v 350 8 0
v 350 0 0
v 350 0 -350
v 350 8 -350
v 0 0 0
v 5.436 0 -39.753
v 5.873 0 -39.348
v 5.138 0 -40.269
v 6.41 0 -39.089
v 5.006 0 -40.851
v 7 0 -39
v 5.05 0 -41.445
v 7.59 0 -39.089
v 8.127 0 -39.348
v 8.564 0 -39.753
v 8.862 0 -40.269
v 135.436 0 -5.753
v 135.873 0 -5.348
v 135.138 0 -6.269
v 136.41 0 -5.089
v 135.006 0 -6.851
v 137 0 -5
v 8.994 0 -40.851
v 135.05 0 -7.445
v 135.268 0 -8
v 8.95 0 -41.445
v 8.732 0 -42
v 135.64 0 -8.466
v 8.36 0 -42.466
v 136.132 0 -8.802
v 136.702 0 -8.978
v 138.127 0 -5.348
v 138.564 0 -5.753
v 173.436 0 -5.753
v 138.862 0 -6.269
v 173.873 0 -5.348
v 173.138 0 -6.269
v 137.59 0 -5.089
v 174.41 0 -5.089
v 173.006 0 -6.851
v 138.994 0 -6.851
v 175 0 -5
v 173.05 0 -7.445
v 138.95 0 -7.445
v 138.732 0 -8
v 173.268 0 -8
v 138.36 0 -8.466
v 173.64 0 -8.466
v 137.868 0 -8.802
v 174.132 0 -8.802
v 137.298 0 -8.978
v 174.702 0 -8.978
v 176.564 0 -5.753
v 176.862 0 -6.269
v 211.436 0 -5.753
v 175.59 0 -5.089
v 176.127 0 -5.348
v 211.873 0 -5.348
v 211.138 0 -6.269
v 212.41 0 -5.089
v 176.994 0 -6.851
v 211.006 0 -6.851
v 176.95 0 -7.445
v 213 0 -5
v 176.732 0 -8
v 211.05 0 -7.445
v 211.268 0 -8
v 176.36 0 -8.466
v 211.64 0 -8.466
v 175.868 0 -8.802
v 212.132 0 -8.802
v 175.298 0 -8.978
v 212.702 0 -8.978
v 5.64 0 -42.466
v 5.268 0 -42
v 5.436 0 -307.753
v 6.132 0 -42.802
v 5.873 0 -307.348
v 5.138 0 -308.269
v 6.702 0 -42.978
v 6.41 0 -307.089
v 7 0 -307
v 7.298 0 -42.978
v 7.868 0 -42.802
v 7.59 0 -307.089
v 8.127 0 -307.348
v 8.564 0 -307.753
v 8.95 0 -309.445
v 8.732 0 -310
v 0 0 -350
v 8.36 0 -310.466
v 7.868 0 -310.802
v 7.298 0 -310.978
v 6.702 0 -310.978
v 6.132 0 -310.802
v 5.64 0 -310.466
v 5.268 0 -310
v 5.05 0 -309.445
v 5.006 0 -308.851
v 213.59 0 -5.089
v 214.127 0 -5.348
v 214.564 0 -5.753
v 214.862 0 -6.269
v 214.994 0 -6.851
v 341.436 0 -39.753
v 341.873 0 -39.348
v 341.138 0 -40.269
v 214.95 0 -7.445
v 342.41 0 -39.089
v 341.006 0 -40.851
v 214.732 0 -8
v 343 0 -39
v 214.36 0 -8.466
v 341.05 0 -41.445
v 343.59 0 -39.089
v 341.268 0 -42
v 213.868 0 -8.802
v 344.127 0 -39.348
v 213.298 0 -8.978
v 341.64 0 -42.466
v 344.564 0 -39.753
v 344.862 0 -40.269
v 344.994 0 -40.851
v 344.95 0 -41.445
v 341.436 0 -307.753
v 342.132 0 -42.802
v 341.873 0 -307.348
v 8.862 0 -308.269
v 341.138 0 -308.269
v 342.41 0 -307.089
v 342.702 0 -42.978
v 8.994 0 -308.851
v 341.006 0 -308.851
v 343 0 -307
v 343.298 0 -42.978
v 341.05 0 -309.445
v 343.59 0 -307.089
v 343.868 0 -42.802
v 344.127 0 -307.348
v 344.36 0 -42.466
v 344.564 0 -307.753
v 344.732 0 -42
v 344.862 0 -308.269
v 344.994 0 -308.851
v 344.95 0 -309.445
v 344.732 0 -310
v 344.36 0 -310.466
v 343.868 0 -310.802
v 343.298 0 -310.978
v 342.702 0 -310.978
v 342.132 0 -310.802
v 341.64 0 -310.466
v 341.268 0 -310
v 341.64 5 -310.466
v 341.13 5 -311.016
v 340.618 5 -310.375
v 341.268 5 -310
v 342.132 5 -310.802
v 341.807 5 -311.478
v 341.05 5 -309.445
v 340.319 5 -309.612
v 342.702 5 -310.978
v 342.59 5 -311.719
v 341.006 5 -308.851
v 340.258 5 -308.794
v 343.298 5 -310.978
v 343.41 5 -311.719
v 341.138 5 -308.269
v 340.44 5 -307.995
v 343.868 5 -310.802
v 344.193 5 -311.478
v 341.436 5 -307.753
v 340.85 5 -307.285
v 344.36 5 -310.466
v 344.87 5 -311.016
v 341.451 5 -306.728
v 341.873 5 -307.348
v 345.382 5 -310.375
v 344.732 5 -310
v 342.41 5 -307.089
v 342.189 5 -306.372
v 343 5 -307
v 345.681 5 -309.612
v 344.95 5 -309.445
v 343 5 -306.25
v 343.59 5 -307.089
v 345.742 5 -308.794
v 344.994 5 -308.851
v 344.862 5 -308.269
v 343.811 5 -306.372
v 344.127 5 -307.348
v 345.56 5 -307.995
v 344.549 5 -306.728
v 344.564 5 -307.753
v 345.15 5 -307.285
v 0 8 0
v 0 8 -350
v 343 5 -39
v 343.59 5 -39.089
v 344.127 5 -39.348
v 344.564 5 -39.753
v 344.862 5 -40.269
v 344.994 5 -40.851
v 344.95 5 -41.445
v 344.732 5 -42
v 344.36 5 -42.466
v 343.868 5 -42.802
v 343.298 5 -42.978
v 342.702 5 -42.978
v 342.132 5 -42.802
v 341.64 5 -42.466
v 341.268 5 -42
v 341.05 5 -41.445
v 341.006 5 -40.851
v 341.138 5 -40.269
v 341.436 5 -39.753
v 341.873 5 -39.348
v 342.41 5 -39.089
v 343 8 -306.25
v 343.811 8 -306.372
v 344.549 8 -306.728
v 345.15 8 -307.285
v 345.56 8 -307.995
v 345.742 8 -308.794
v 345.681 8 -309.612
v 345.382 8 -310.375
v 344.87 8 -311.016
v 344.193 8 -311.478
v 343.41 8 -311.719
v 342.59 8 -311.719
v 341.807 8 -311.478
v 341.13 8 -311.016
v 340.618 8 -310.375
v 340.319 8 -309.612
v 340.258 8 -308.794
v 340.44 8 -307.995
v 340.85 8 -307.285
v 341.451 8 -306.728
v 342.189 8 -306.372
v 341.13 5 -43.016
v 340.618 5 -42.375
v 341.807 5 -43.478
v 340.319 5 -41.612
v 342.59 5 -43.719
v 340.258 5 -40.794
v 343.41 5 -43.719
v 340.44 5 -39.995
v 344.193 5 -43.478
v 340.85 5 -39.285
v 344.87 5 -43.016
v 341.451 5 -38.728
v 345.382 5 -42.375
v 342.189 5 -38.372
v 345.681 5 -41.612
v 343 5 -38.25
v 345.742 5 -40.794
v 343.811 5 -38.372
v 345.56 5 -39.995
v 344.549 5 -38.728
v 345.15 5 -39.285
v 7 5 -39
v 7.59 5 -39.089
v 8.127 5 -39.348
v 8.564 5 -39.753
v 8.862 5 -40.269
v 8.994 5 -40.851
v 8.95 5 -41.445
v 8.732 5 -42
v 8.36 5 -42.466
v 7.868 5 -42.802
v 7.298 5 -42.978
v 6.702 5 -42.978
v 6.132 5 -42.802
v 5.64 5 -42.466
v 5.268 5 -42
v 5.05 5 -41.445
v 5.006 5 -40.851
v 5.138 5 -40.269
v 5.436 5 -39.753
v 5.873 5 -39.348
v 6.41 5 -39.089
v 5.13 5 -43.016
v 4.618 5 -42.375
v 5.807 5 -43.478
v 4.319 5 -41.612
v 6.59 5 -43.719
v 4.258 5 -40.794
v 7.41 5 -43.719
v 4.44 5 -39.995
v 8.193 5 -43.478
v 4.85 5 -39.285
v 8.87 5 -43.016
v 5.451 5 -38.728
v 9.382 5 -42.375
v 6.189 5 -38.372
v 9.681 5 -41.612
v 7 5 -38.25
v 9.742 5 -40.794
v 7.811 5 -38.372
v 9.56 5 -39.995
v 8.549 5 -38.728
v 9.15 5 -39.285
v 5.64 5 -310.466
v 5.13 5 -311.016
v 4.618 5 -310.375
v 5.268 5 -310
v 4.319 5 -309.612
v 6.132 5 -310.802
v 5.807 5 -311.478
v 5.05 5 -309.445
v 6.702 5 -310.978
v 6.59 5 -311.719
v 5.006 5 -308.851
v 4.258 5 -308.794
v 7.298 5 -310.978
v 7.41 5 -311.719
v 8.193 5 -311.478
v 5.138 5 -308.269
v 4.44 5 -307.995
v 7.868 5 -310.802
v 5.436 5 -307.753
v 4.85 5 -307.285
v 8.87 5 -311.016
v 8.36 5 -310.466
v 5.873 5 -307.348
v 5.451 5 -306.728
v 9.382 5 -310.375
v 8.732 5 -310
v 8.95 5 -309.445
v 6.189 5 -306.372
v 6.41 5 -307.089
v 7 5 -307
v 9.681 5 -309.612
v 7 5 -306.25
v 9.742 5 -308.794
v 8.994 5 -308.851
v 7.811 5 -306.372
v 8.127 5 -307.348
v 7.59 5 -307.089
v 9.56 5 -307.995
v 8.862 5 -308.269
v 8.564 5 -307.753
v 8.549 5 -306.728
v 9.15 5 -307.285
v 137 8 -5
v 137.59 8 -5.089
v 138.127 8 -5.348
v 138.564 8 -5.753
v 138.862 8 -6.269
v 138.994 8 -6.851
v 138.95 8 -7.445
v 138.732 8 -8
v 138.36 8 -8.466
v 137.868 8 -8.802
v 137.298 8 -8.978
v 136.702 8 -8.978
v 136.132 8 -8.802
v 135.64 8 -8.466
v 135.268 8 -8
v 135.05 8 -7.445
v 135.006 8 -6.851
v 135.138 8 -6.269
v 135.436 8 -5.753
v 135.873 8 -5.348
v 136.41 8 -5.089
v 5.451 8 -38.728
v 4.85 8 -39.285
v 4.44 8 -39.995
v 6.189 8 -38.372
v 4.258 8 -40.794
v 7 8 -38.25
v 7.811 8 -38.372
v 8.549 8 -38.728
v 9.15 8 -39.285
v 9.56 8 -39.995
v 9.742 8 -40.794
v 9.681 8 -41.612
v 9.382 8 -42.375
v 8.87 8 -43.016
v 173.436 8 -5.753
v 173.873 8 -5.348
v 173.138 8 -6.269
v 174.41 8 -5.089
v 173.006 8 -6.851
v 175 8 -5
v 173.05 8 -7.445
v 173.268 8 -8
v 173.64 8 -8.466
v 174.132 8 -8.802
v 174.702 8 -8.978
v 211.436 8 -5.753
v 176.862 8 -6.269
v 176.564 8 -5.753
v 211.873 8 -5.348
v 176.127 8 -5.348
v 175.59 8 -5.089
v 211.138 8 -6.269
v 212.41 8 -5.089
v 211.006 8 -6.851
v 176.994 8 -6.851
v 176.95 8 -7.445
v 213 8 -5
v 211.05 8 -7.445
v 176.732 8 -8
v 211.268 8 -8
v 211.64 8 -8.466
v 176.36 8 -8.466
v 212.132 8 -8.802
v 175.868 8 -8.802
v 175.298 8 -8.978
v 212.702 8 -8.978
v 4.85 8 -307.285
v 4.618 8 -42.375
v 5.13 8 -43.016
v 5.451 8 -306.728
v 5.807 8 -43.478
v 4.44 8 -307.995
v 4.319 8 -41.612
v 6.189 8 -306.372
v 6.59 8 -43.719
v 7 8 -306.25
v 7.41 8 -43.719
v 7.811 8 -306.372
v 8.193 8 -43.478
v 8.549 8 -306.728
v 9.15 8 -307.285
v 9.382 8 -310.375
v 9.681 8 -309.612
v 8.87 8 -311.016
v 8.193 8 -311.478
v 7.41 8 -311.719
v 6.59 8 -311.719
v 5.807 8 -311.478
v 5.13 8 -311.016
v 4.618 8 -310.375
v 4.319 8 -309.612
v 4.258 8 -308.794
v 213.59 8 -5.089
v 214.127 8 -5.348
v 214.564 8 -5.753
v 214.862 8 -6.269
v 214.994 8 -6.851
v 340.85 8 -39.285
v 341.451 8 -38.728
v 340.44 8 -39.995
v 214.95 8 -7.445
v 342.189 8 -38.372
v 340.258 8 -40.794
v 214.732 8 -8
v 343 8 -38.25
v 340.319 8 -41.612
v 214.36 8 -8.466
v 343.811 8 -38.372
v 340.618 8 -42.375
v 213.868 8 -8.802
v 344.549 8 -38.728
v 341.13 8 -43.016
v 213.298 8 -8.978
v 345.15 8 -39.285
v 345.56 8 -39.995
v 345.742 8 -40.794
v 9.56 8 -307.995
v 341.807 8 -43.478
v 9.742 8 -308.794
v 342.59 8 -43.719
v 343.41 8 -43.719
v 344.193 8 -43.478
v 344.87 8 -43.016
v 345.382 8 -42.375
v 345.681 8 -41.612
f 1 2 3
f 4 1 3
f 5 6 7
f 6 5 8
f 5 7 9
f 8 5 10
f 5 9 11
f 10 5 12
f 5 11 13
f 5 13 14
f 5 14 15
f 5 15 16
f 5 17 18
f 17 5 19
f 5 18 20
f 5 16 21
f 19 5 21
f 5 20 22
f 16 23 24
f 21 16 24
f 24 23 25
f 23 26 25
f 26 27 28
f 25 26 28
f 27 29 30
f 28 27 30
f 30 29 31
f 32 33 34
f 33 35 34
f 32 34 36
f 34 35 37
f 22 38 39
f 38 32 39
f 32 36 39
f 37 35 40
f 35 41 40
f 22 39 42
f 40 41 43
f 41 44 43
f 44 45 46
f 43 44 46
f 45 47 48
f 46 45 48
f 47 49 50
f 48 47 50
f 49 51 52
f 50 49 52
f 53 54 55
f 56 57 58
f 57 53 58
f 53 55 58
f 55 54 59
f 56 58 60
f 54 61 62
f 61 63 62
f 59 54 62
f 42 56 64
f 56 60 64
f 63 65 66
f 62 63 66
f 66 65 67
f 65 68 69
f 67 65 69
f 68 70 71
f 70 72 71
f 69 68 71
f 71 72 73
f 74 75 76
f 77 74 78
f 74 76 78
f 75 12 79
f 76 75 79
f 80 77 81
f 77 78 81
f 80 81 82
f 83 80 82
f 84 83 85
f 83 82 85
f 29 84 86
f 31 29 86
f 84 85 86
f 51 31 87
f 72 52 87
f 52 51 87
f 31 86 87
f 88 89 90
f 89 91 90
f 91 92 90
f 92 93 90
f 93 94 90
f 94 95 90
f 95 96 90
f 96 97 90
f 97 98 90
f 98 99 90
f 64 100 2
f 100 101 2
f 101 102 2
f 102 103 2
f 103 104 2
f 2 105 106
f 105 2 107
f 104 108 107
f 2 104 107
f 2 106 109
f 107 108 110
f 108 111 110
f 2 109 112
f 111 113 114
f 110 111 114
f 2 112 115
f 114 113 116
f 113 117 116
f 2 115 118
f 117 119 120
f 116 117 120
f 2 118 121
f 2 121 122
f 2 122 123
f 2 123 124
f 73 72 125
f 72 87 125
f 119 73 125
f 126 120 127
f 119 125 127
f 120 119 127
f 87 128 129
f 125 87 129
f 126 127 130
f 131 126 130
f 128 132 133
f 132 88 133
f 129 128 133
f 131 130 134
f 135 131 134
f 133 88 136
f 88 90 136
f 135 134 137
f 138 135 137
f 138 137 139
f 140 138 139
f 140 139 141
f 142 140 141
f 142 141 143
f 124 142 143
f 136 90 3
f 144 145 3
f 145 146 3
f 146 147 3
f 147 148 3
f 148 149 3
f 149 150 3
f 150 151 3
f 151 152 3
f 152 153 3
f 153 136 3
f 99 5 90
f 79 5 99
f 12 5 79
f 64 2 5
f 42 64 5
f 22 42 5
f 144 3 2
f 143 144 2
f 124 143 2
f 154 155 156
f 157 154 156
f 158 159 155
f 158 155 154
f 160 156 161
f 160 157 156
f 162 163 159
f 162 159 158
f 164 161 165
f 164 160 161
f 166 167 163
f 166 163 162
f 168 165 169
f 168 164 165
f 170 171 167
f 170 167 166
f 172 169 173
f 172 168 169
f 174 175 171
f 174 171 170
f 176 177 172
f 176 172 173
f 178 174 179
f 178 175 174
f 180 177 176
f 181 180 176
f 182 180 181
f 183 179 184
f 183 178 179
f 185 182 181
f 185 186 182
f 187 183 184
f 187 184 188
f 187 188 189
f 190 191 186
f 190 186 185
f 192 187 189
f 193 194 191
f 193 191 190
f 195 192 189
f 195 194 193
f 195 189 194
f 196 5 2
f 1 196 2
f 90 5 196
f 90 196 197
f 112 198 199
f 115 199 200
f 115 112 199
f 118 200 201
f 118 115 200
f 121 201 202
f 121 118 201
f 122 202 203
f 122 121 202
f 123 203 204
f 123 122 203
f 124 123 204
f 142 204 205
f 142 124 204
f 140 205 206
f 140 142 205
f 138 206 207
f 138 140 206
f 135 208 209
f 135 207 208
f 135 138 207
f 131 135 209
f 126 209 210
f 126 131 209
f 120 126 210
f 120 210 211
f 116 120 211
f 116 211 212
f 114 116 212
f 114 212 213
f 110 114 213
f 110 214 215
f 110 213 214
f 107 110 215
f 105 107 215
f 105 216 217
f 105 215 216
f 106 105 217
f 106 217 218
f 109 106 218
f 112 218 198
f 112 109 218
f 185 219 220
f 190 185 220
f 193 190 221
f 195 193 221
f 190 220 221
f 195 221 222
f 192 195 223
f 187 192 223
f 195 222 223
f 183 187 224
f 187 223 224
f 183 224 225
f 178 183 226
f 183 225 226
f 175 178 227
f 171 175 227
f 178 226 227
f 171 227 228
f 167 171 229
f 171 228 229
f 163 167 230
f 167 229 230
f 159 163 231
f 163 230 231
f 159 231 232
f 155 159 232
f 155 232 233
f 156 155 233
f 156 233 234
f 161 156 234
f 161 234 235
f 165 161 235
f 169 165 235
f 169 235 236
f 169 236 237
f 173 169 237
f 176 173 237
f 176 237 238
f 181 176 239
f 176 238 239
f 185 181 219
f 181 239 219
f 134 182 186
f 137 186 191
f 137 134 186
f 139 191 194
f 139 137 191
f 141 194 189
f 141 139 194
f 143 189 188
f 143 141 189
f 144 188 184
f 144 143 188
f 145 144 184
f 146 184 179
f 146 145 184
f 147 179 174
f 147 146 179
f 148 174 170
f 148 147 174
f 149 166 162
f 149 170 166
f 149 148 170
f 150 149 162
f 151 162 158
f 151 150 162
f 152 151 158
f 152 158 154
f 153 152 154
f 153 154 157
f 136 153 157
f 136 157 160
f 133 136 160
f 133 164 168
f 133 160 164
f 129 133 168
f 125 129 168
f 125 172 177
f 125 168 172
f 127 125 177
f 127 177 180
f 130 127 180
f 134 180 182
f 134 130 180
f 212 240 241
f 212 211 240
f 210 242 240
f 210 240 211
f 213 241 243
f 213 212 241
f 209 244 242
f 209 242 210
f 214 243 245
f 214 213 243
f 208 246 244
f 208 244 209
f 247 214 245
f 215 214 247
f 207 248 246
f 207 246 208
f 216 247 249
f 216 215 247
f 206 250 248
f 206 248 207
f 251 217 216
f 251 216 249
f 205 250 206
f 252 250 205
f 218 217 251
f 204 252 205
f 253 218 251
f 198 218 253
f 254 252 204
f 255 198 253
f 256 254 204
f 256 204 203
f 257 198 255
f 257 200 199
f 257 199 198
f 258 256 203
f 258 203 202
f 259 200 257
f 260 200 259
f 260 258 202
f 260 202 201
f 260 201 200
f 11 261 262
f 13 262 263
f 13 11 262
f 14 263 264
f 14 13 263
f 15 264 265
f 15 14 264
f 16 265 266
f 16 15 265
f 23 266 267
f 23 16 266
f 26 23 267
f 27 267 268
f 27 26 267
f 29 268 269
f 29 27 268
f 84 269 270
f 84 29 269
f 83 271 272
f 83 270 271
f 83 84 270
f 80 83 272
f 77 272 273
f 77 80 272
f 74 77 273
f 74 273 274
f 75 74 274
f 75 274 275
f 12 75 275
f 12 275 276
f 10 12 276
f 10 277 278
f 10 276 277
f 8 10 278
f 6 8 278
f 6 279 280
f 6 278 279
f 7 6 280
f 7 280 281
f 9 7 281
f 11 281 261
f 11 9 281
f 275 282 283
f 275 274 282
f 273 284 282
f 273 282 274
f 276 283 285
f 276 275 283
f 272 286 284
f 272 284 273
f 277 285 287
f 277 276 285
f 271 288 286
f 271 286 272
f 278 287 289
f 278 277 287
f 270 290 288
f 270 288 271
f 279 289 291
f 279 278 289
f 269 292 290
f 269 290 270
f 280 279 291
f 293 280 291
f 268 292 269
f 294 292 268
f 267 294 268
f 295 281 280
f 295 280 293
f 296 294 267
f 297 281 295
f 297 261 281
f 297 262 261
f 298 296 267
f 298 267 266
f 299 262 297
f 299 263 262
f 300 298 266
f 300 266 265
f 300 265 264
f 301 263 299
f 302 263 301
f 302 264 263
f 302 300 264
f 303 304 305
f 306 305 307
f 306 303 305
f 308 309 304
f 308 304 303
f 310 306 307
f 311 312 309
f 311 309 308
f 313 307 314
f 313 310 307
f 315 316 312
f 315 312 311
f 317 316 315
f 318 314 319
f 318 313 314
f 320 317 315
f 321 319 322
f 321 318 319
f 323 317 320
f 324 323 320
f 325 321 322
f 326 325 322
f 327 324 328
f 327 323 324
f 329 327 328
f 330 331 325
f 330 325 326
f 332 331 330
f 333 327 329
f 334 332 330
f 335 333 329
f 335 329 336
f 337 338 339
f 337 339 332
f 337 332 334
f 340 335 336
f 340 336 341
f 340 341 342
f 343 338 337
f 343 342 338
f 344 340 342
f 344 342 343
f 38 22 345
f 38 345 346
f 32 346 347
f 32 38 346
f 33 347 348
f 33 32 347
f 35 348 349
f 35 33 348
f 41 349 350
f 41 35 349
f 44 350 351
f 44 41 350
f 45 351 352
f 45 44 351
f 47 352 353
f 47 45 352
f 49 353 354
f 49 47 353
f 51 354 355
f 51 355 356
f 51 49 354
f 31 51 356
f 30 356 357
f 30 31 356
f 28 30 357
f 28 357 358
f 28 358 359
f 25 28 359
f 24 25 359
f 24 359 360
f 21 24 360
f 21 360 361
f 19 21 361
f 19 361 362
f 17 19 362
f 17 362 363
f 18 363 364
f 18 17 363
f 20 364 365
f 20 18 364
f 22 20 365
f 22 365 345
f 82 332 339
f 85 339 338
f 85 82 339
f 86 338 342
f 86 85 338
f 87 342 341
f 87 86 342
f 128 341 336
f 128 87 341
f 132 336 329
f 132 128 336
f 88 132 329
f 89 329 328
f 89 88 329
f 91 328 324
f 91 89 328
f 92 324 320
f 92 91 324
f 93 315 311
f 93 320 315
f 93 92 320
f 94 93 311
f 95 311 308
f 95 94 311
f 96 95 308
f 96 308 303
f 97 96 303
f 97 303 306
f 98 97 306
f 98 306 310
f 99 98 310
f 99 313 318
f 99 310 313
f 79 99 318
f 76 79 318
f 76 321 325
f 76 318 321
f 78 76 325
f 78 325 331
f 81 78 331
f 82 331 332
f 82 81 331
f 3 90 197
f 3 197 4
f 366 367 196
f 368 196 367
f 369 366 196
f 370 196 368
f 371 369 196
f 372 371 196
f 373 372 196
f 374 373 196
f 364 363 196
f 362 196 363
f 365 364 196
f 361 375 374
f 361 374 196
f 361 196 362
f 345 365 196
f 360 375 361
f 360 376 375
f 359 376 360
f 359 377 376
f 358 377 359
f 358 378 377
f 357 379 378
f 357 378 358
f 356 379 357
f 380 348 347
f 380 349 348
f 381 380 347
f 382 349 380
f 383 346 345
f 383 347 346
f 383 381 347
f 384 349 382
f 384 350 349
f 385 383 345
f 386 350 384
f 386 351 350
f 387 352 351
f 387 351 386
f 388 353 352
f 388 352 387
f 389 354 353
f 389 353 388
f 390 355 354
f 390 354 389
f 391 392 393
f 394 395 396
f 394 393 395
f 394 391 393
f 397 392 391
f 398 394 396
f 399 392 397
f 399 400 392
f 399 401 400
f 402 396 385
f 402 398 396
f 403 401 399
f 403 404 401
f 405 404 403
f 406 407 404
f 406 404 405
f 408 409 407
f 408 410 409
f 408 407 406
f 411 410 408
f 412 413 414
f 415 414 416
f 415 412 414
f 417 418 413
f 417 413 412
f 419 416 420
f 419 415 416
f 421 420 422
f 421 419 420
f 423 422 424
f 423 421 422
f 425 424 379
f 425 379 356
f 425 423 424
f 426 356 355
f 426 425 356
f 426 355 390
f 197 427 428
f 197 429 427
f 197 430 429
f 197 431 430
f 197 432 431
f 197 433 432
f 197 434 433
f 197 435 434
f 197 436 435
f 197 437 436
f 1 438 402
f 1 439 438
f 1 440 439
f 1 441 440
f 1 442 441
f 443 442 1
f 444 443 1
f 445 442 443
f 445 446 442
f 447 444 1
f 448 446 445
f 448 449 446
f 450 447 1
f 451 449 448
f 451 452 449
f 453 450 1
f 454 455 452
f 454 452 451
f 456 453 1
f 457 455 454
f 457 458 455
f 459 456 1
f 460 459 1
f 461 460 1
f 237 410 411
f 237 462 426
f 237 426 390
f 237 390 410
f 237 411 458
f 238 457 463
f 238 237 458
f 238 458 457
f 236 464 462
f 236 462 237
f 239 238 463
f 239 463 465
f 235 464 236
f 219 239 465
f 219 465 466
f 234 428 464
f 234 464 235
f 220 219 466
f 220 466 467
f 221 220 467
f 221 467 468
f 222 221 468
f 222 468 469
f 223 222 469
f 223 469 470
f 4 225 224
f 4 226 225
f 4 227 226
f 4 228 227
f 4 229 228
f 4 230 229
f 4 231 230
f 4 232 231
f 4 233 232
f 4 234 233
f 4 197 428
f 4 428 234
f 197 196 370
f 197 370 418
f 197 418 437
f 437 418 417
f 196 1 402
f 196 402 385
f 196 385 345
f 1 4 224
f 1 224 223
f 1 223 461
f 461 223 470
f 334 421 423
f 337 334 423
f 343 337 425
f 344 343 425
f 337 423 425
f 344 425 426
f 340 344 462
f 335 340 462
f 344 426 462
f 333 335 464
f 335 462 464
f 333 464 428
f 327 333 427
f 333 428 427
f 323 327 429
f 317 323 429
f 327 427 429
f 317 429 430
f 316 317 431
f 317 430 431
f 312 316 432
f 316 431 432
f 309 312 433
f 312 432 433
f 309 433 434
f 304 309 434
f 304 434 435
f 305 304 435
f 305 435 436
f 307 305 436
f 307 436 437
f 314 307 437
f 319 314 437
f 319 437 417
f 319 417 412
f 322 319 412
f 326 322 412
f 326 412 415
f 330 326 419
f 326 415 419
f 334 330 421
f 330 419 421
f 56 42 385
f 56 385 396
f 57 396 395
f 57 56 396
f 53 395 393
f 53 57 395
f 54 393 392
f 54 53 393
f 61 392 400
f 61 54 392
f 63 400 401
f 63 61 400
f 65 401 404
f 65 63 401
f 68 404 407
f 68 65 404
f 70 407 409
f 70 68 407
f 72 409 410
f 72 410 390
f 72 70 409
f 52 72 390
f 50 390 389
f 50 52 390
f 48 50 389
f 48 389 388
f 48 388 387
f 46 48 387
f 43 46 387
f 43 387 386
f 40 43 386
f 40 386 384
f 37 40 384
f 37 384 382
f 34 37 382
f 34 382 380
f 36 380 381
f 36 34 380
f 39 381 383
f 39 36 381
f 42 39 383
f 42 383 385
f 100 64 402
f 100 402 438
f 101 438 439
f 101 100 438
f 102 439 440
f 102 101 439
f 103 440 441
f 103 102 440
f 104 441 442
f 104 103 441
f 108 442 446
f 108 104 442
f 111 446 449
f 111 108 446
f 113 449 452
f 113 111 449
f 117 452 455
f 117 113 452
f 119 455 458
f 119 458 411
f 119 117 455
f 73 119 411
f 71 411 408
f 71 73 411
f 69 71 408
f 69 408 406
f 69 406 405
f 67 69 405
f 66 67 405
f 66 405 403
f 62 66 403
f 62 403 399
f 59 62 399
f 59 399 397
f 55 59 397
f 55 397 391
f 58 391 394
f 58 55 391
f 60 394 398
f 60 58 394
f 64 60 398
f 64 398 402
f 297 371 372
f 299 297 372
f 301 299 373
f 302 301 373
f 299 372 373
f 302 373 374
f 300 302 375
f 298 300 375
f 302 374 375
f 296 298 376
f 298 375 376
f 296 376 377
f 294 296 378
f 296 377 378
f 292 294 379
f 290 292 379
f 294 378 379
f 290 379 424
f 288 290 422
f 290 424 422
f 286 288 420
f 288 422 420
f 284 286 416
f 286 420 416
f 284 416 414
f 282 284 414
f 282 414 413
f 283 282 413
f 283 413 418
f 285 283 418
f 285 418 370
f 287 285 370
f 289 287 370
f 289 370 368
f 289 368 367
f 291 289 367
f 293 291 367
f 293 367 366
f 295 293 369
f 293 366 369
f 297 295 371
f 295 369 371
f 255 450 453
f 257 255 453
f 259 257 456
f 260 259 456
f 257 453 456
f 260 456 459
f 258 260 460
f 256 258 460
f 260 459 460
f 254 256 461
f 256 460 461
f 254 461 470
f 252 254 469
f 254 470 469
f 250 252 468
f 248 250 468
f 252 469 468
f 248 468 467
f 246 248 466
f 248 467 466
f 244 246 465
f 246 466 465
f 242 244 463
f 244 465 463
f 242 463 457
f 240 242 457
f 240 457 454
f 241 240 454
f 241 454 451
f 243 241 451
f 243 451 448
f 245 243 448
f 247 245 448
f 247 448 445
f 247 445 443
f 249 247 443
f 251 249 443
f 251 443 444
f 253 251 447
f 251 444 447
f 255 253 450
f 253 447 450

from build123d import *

# Parameters (mm, degrees)
PLATESKETCH2_W         = 350
PLATESKETCH2_H         = 350
PLATESKETCH2_R         = 2
BOSS_EXTRUDE1_DEPTH    = 8
BORESKETCH1_R          = 2.75
BORECUT_EXTRUDE1_DEPTH = 3


with BuildPart() as part:
    # PlateSketch2 → Boss-Extrude1 (new body)
    with BuildSketch(Plane(origin=(0, 0, 0), x_dir=(1, 0, 0), z_dir=(0, 1, 0))):
        with Locations((175, 175)):
            Rectangle(PLATESKETCH2_W, PLATESKETCH2_H)
        with Locations(Location((7, 309, 0), (0, 0, 270))):
            Circle(PLATESKETCH2_R, mode=Mode.SUBTRACT)
        with Locations(Location((343, 309, 0), (0, 0, 270))):
            Circle(PLATESKETCH2_R, mode=Mode.SUBTRACT)
        with Locations(Location((137, 7, 0), (0, 0, 270))):
            Circle(PLATESKETCH2_R, mode=Mode.SUBTRACT)
        with Locations(Location((175, 7, 0), (0, 0, 270))):
            Circle(PLATESKETCH2_R, mode=Mode.SUBTRACT)
        with Locations(Location((213, 7, 0), (0, 0, 270))):
            Circle(PLATESKETCH2_R, mode=Mode.SUBTRACT)
        with Locations(Location((7, 41, 0), (0, 0, 270))):
            Circle(PLATESKETCH2_R, mode=Mode.SUBTRACT)
        with Locations(Location((343, 41, 0), (0, 0, 270))):
            Circle(PLATESKETCH2_R, mode=Mode.SUBTRACT)
    extrude(amount=BOSS_EXTRUDE1_DEPTH)

    # BoreSketch1 → BoreCut-Extrude1 (cut)
    with BuildSketch(Plane(origin=(0, 8, 0), x_dir=(1, 0, 0), z_dir=(0, 1, 0))):
        with Locations(Location((7, 309, 0), (0, 0, 270))):
            Circle(BORESKETCH1_R)
        with Locations(Location((343, 309, 0), (0, 0, 270))):
            Circle(BORESKETCH1_R)
        with Locations(Location((7, 41, 0), (0, 0, 270))):
            Circle(BORESKETCH1_R)
        with Locations(Location((343, 41, 0), (0, 0, 270))):
            Circle(BORESKETCH1_R)
    extrude(amount=-BORECUT_EXTRUDE1_DEPTH, mode=Mode.SUBTRACT)


solid = part.part
